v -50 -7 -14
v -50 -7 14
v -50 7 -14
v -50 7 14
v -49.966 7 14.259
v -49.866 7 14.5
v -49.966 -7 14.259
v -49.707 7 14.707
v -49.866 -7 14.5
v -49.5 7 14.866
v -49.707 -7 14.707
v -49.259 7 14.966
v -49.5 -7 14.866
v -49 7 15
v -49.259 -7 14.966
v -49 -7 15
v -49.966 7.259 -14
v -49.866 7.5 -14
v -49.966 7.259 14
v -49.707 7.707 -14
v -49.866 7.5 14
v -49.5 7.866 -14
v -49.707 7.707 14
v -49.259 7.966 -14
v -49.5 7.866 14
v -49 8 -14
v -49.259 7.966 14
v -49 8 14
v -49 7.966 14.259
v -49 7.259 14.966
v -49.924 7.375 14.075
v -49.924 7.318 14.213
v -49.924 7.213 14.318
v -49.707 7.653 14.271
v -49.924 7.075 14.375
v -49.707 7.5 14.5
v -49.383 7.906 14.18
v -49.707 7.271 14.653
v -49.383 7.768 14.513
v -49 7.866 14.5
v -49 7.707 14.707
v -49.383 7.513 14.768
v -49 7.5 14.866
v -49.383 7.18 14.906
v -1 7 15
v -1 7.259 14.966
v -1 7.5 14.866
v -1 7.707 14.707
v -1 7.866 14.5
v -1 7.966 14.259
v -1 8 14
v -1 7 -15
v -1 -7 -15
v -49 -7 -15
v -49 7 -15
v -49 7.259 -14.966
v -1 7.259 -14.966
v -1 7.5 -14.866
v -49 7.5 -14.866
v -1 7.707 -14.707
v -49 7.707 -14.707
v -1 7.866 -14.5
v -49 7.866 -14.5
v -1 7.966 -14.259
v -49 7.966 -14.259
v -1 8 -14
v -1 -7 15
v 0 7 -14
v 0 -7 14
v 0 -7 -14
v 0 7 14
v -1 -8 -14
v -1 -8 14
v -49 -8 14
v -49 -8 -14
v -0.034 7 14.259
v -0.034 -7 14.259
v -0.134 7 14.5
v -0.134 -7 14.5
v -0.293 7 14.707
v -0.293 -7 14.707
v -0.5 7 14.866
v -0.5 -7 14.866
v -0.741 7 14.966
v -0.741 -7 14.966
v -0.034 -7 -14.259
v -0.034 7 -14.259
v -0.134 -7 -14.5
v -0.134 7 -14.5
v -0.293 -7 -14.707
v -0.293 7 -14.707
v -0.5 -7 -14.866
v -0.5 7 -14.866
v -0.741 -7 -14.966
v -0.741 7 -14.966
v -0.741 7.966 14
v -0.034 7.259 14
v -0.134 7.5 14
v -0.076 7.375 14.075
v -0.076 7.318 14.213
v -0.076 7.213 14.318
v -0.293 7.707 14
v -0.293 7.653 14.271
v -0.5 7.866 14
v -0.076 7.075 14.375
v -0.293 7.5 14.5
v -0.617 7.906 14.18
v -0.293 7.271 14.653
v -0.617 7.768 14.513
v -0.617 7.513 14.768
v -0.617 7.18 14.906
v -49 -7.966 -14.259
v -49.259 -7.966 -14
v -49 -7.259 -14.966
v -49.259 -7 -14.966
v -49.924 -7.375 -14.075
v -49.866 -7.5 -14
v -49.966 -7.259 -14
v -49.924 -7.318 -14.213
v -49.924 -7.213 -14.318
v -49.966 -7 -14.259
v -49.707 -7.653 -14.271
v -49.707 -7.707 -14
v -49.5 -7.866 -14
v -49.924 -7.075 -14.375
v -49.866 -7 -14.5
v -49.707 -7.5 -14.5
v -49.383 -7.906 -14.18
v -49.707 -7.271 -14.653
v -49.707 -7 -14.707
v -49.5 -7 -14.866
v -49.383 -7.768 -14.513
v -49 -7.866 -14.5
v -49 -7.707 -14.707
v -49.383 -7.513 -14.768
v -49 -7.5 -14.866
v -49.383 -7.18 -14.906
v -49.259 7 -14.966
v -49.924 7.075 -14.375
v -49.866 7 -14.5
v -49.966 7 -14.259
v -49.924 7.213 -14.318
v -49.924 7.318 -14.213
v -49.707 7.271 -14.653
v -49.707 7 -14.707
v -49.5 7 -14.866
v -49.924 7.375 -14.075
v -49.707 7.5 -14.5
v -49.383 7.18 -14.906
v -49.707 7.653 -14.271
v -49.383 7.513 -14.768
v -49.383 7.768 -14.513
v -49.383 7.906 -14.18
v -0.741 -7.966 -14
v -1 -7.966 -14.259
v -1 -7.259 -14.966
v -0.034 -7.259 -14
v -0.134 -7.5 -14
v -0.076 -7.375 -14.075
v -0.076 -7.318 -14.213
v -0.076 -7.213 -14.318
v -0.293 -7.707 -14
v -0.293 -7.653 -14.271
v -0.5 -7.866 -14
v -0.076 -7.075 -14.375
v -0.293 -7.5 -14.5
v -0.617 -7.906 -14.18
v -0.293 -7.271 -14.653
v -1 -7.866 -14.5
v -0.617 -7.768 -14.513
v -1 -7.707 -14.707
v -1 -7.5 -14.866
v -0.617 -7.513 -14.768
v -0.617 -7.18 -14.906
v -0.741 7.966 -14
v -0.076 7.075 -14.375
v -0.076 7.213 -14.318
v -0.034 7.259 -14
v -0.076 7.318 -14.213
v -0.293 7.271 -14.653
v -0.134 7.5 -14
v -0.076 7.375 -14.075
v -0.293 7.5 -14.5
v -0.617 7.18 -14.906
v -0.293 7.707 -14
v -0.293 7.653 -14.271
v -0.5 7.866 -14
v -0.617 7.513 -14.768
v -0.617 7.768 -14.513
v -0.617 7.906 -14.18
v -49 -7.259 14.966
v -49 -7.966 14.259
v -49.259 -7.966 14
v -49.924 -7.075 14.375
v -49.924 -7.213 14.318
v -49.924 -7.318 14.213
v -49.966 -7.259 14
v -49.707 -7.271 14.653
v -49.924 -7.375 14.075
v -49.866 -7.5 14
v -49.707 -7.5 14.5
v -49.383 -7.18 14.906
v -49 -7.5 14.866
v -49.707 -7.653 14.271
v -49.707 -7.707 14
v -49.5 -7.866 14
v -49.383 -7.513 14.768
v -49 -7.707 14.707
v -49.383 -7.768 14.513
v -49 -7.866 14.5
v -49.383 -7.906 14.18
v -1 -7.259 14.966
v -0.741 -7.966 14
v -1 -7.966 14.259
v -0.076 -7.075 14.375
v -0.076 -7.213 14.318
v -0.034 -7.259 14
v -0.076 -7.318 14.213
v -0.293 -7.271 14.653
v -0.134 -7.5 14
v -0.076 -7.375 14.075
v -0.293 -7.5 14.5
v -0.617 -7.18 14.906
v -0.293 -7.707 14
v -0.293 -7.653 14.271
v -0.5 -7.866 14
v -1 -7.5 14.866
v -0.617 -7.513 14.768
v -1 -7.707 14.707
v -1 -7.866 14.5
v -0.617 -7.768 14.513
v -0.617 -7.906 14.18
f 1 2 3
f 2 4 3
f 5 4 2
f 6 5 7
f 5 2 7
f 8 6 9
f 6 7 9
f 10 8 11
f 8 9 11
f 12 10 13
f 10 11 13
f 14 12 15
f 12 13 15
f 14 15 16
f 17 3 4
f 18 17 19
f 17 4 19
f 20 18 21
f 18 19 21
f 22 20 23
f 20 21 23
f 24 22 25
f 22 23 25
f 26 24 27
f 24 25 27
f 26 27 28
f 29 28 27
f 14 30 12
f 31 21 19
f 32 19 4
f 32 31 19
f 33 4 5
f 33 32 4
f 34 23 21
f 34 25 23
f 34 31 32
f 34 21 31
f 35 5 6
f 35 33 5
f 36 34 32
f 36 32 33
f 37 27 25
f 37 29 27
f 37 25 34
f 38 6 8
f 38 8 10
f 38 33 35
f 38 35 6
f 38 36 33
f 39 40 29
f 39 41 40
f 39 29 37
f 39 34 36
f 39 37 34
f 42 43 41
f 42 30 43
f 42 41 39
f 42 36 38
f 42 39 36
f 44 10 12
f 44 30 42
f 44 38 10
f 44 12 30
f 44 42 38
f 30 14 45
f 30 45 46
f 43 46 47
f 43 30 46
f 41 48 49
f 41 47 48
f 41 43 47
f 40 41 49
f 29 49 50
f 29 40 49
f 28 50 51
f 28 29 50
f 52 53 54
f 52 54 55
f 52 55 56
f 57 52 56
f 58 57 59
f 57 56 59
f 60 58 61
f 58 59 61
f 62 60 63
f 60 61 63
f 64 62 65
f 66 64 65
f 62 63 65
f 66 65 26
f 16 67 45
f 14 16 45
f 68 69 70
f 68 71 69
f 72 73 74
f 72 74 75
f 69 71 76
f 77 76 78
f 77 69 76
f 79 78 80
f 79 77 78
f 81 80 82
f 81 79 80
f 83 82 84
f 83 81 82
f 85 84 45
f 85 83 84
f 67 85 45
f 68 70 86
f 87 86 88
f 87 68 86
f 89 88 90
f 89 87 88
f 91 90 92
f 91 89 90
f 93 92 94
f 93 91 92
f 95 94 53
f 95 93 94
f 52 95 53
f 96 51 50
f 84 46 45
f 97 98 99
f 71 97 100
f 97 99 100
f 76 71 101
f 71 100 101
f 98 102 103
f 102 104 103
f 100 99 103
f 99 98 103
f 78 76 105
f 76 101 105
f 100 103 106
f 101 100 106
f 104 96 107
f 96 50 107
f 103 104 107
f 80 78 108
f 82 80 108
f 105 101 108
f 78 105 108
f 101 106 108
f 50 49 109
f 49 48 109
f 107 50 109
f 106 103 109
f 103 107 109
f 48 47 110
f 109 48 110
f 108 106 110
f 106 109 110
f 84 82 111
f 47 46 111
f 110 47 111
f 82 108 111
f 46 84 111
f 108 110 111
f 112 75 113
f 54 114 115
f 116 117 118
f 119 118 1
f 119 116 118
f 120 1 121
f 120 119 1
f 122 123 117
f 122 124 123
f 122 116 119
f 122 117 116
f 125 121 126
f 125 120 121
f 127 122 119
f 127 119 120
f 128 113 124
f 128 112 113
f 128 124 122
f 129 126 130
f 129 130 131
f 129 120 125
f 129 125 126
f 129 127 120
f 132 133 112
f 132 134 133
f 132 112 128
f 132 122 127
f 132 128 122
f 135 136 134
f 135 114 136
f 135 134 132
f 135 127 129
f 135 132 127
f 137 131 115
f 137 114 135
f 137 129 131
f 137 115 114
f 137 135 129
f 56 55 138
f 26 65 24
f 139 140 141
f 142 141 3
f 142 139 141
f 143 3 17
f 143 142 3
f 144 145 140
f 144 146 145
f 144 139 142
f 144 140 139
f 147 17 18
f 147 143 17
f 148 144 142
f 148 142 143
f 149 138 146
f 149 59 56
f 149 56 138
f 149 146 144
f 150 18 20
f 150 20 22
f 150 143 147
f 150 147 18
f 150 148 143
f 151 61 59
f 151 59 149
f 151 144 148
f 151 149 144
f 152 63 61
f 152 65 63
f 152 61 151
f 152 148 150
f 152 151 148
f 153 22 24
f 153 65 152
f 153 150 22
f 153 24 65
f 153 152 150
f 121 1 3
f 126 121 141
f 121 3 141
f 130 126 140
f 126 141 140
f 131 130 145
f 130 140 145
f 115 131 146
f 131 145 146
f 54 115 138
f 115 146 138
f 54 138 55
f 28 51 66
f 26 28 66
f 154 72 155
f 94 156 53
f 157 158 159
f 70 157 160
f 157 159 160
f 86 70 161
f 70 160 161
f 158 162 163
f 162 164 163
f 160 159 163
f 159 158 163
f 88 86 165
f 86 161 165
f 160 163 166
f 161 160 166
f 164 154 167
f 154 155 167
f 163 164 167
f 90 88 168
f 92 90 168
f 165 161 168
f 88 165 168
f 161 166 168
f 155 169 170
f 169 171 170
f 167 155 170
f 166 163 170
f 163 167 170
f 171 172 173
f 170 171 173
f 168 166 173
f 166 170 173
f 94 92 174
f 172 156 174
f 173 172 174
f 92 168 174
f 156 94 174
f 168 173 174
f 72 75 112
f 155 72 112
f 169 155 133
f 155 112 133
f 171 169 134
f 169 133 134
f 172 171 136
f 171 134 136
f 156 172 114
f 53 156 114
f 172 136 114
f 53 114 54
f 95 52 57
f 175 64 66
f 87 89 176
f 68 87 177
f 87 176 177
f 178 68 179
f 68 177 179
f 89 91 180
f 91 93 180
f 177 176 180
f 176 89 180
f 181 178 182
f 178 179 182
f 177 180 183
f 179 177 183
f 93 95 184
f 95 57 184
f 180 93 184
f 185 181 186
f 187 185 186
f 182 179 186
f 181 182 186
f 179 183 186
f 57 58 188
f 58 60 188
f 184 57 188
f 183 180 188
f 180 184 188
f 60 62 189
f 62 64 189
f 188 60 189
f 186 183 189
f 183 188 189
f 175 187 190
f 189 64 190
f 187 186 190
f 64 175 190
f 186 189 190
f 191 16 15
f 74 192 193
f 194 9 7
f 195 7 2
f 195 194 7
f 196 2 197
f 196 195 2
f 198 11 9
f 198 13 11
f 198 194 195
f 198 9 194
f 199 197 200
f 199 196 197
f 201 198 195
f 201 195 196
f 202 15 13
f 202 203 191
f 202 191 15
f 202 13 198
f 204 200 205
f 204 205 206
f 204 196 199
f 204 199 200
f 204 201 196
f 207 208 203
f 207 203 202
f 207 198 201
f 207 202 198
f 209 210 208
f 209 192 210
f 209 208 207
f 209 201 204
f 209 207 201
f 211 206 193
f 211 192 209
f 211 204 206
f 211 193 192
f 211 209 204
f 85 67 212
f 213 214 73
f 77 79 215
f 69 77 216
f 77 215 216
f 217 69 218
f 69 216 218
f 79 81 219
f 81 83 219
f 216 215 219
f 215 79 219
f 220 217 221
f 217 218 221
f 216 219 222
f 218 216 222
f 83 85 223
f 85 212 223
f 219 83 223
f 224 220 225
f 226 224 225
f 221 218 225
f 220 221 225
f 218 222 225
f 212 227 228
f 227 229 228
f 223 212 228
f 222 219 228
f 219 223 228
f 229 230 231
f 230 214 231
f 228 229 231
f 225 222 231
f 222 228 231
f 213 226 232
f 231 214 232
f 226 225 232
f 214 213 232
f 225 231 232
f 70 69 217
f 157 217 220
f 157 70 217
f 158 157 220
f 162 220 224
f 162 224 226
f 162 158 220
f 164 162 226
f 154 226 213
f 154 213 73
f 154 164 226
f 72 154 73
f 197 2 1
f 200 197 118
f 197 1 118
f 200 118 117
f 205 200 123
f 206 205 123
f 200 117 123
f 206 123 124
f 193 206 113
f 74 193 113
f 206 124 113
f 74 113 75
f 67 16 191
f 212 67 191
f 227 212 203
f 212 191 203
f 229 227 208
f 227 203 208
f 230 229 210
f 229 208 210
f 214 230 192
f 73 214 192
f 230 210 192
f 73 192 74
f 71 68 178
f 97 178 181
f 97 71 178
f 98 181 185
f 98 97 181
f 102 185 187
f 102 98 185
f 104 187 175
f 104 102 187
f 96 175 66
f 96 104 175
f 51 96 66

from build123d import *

# Parameters (mm, degrees)
SKETCH1_W           = 30
SKETCH1_H           = 16
BOSS_EXTRUDE1_DEPTH = 50
FILLET1_R           = 1
FILLET2_R           = 1


with BuildPart() as part:
    # Sketch1 → Boss-Extrude1 (new body)
    with BuildSketch(Plane(origin=(0, 0, 0), x_dir=(0, 0, -1), z_dir=(1, 0, 0))):
        Rectangle(SKETCH1_W, SKETCH1_H)
    extrude(amount=-BOSS_EXTRUDE1_DEPTH)

    # Fillet1
    fillet1_edges = [part.edges().sort_by_distance(p)[0] for p in [
        (-25, -8, -15),
        (-25, -8, 15),
        (-25, 8, 15),
        (-25, 8, -15),
    ]]
    fillet(fillet1_edges, radius=FILLET1_R)

    # Fillet2
    fillet2_edges = [part.edges().sort_by_distance(p)[0] for p in [
        (0, -8, 0),
        (-50, -8, 0),
        (0, 0, -15),
        (0, 8, 0),
        (0, 0, 15),
        (0, 7.707106781, 14.707106781),
        (0, 7.707106781, -14.707106781),
        (0, -7.707106781, 14.707106781),
        (0, -7.707106781, -14.707106781),
        (-50, 0, -15),
        (-50, 0, 15),
        (-50, 8, 0),
        (-50, 7.707106781, 14.707106781),
        (-50, 7.707106781, -14.707106781),
        (-50, -7.707106781, 14.707106781),
        (-50, -7.707106781, -14.707106781),
    ]]
    fillet(fillet2_edges, radius=FILLET2_R)


solid = part.part
